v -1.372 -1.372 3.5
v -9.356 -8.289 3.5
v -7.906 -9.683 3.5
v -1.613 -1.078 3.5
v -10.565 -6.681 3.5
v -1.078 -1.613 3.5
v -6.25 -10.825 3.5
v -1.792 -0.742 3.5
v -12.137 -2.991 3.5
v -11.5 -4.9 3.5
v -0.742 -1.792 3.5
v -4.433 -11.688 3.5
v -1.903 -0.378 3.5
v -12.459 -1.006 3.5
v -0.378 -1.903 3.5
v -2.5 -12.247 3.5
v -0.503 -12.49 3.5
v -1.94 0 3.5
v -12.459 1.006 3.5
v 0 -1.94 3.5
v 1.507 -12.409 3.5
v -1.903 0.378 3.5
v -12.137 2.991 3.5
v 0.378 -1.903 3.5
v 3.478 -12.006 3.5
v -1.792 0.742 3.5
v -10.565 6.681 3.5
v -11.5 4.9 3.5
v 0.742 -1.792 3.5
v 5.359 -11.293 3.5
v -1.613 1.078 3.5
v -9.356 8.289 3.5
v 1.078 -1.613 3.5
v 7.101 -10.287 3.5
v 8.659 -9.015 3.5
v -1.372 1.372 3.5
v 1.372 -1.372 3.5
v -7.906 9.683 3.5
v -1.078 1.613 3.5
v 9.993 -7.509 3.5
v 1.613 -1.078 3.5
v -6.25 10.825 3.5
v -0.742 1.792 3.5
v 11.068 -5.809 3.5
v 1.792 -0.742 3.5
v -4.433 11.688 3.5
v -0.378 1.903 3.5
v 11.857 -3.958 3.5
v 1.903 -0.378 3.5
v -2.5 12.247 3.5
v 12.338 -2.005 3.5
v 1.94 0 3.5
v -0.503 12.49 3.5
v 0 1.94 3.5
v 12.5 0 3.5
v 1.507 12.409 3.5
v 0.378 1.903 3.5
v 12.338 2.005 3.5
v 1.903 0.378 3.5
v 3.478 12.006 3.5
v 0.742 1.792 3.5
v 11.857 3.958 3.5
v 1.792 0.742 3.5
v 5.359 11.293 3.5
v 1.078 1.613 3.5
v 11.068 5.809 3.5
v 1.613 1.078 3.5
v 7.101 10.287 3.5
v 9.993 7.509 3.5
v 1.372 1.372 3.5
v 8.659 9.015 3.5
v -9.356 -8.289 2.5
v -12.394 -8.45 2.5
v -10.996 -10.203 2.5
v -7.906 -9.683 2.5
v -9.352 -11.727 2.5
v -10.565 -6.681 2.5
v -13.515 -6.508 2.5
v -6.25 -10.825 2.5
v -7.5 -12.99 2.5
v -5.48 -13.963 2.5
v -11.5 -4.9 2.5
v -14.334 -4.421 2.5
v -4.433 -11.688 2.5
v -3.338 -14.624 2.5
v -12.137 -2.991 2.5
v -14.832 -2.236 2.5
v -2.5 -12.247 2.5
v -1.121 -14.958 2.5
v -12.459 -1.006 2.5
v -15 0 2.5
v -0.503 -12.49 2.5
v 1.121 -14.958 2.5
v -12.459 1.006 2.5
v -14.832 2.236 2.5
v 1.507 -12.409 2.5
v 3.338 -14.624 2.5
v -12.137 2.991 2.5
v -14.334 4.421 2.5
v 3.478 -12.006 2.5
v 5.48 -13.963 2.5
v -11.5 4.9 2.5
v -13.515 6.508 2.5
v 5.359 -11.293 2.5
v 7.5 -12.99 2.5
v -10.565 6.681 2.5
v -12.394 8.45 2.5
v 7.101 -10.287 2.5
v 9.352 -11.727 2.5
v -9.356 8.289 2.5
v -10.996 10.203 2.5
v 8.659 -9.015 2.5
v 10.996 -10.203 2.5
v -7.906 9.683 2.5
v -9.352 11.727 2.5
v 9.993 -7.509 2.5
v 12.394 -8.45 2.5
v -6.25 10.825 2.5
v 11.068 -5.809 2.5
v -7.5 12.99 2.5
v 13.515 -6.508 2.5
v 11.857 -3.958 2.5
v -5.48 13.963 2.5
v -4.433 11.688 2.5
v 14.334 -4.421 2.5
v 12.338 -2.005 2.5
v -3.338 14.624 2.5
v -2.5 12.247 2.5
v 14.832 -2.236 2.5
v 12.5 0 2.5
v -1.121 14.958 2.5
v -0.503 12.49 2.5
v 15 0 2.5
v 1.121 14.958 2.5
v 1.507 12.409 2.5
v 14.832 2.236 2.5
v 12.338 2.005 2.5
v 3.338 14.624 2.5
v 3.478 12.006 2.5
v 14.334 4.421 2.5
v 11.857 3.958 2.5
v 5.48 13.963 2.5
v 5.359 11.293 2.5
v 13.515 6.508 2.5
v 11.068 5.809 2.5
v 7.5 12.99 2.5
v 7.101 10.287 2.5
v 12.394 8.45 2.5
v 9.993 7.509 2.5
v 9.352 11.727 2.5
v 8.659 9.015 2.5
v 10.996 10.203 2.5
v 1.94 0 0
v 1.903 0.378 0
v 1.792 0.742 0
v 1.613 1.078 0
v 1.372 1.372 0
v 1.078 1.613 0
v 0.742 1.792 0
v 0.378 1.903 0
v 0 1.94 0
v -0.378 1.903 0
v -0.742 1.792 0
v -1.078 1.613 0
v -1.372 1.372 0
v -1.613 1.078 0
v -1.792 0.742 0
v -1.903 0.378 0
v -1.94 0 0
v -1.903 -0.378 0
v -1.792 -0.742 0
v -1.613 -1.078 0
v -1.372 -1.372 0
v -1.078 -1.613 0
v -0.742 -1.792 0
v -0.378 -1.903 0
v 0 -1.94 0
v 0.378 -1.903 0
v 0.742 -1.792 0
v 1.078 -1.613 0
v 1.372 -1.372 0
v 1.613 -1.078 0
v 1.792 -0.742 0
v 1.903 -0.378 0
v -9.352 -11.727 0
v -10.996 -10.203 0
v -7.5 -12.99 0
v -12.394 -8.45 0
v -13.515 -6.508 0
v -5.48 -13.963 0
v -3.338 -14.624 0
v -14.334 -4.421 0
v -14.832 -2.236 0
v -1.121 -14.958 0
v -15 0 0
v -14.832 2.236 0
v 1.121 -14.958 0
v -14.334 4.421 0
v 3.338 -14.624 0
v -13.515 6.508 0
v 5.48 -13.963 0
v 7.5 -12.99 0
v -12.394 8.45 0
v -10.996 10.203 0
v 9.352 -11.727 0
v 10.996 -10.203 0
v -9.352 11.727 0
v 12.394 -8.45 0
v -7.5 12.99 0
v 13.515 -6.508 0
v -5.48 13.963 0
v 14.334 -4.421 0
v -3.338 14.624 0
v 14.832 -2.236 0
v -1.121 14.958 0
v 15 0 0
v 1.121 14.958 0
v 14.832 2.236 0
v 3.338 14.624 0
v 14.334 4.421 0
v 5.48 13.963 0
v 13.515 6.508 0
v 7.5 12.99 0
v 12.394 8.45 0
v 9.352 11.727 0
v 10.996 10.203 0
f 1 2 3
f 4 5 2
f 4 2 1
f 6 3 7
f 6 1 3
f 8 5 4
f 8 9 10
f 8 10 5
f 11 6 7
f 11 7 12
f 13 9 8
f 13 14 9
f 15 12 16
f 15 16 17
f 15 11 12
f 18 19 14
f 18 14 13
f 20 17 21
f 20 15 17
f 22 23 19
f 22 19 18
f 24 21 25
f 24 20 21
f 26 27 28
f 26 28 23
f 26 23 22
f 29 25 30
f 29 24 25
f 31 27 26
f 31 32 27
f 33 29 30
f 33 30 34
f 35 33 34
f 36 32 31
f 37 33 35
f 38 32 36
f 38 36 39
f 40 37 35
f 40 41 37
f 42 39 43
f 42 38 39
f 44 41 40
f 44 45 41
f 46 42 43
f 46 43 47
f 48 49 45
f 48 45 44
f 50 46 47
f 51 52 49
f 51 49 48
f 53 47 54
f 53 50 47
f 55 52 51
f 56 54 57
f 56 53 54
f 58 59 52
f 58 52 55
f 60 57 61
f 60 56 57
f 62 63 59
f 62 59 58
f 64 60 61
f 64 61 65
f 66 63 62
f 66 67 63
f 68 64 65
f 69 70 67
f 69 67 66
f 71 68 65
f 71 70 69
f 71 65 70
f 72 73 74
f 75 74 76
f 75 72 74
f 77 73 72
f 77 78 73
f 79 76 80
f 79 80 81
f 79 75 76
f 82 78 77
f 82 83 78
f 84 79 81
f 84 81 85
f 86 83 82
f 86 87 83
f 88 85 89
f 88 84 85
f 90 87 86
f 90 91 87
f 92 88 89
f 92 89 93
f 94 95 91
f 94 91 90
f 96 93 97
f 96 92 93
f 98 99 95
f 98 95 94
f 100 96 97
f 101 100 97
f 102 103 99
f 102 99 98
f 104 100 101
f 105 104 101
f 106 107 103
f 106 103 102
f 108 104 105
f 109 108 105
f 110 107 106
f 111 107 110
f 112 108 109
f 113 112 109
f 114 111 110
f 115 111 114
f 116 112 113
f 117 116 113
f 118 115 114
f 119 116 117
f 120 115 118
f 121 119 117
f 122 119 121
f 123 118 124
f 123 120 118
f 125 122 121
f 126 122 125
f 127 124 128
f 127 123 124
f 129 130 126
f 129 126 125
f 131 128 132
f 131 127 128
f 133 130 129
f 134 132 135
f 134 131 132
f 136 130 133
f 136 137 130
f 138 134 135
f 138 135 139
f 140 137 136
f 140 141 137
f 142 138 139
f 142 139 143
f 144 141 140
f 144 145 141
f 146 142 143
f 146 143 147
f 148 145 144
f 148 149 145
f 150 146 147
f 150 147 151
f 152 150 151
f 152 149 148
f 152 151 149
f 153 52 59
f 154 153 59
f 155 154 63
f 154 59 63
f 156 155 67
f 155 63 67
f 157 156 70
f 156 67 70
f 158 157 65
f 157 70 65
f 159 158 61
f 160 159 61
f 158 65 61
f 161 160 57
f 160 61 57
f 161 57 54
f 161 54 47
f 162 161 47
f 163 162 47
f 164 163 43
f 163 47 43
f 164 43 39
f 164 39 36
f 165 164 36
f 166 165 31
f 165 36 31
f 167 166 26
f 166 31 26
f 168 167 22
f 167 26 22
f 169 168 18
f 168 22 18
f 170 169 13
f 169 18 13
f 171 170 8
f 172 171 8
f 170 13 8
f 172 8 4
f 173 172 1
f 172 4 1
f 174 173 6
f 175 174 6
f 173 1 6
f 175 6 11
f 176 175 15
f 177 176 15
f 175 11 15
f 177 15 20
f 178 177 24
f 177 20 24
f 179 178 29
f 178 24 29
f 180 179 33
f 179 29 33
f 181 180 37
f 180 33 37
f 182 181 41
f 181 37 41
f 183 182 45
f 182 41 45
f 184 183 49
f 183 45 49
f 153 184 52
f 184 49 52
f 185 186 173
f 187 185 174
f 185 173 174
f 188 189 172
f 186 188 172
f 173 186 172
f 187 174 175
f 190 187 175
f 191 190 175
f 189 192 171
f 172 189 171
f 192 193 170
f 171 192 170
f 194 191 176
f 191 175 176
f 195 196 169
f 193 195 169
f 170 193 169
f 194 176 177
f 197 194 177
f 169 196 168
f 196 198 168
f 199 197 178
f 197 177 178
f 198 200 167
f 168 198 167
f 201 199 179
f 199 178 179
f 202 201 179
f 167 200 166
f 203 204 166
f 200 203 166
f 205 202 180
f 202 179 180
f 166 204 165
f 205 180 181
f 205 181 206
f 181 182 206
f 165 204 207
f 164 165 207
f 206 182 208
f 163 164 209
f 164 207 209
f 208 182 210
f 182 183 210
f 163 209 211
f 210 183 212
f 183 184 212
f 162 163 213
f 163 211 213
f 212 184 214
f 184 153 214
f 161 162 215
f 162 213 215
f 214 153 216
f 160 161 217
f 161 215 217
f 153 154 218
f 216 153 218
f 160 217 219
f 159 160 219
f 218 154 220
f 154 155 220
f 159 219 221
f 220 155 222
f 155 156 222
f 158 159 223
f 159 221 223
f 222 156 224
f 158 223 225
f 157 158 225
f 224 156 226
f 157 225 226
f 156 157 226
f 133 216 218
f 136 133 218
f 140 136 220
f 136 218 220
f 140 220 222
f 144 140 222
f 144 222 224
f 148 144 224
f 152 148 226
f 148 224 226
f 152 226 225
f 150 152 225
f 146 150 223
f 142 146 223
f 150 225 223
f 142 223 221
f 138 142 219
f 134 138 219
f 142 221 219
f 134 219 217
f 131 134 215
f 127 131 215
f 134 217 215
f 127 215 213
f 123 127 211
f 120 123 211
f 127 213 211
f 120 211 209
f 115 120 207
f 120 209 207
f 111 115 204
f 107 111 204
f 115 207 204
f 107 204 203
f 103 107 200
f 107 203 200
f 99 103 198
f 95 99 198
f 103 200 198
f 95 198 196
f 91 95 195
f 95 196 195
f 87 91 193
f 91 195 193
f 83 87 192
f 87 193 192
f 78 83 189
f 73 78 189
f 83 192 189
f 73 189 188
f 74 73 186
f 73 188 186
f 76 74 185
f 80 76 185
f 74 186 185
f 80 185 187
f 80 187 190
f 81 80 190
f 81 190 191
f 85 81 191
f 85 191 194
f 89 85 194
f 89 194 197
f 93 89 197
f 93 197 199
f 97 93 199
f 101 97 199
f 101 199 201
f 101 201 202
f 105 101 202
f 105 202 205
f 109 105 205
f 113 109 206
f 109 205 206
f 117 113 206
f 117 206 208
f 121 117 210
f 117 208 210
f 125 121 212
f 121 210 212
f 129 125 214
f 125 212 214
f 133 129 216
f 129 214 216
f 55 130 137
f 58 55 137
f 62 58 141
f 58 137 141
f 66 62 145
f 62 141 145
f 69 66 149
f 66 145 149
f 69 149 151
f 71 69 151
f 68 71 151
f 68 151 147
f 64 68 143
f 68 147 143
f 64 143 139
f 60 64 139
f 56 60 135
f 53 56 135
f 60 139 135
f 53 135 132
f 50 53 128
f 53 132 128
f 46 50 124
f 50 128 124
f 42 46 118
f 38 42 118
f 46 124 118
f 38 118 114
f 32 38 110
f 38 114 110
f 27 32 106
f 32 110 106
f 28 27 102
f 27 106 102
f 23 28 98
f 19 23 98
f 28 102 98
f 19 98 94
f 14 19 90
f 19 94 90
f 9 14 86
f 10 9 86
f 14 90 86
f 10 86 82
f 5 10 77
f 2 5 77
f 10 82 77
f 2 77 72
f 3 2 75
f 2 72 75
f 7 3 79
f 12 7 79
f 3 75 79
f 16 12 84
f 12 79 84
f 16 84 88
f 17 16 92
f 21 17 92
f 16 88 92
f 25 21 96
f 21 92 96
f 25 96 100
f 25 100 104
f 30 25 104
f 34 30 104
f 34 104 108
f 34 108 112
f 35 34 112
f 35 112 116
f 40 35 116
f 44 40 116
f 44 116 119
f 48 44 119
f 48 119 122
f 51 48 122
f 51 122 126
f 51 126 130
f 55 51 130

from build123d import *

# Parameters (mm, degrees)
F0_R     = 15
F1_DEPTH = 2.5
F2_R     = 12.5
F3_DEPTH = 1
F4_R     = 1.94
F5_DEPTH = 3.5


with BuildPart() as f1:
    # F0 (on Top) → F1 (new body)
    with BuildSketch(Plane.XY):
        Circle(F0_R)
    extrude(amount=F1_DEPTH)

    # F2 (on face) → F3 (join)
    with BuildSketch(Plane.XY.offset(2.5)):
        Circle(F2_R)
    extrude(amount=F3_DEPTH)

    # F4 (on face) → F5 (cut, through all)
    with BuildSketch(Plane.XY.offset(3.5)):
        Circle(F4_R)
    extrude(amount=-F5_DEPTH, mode=Mode.SUBTRACT)


solid = f1.part
